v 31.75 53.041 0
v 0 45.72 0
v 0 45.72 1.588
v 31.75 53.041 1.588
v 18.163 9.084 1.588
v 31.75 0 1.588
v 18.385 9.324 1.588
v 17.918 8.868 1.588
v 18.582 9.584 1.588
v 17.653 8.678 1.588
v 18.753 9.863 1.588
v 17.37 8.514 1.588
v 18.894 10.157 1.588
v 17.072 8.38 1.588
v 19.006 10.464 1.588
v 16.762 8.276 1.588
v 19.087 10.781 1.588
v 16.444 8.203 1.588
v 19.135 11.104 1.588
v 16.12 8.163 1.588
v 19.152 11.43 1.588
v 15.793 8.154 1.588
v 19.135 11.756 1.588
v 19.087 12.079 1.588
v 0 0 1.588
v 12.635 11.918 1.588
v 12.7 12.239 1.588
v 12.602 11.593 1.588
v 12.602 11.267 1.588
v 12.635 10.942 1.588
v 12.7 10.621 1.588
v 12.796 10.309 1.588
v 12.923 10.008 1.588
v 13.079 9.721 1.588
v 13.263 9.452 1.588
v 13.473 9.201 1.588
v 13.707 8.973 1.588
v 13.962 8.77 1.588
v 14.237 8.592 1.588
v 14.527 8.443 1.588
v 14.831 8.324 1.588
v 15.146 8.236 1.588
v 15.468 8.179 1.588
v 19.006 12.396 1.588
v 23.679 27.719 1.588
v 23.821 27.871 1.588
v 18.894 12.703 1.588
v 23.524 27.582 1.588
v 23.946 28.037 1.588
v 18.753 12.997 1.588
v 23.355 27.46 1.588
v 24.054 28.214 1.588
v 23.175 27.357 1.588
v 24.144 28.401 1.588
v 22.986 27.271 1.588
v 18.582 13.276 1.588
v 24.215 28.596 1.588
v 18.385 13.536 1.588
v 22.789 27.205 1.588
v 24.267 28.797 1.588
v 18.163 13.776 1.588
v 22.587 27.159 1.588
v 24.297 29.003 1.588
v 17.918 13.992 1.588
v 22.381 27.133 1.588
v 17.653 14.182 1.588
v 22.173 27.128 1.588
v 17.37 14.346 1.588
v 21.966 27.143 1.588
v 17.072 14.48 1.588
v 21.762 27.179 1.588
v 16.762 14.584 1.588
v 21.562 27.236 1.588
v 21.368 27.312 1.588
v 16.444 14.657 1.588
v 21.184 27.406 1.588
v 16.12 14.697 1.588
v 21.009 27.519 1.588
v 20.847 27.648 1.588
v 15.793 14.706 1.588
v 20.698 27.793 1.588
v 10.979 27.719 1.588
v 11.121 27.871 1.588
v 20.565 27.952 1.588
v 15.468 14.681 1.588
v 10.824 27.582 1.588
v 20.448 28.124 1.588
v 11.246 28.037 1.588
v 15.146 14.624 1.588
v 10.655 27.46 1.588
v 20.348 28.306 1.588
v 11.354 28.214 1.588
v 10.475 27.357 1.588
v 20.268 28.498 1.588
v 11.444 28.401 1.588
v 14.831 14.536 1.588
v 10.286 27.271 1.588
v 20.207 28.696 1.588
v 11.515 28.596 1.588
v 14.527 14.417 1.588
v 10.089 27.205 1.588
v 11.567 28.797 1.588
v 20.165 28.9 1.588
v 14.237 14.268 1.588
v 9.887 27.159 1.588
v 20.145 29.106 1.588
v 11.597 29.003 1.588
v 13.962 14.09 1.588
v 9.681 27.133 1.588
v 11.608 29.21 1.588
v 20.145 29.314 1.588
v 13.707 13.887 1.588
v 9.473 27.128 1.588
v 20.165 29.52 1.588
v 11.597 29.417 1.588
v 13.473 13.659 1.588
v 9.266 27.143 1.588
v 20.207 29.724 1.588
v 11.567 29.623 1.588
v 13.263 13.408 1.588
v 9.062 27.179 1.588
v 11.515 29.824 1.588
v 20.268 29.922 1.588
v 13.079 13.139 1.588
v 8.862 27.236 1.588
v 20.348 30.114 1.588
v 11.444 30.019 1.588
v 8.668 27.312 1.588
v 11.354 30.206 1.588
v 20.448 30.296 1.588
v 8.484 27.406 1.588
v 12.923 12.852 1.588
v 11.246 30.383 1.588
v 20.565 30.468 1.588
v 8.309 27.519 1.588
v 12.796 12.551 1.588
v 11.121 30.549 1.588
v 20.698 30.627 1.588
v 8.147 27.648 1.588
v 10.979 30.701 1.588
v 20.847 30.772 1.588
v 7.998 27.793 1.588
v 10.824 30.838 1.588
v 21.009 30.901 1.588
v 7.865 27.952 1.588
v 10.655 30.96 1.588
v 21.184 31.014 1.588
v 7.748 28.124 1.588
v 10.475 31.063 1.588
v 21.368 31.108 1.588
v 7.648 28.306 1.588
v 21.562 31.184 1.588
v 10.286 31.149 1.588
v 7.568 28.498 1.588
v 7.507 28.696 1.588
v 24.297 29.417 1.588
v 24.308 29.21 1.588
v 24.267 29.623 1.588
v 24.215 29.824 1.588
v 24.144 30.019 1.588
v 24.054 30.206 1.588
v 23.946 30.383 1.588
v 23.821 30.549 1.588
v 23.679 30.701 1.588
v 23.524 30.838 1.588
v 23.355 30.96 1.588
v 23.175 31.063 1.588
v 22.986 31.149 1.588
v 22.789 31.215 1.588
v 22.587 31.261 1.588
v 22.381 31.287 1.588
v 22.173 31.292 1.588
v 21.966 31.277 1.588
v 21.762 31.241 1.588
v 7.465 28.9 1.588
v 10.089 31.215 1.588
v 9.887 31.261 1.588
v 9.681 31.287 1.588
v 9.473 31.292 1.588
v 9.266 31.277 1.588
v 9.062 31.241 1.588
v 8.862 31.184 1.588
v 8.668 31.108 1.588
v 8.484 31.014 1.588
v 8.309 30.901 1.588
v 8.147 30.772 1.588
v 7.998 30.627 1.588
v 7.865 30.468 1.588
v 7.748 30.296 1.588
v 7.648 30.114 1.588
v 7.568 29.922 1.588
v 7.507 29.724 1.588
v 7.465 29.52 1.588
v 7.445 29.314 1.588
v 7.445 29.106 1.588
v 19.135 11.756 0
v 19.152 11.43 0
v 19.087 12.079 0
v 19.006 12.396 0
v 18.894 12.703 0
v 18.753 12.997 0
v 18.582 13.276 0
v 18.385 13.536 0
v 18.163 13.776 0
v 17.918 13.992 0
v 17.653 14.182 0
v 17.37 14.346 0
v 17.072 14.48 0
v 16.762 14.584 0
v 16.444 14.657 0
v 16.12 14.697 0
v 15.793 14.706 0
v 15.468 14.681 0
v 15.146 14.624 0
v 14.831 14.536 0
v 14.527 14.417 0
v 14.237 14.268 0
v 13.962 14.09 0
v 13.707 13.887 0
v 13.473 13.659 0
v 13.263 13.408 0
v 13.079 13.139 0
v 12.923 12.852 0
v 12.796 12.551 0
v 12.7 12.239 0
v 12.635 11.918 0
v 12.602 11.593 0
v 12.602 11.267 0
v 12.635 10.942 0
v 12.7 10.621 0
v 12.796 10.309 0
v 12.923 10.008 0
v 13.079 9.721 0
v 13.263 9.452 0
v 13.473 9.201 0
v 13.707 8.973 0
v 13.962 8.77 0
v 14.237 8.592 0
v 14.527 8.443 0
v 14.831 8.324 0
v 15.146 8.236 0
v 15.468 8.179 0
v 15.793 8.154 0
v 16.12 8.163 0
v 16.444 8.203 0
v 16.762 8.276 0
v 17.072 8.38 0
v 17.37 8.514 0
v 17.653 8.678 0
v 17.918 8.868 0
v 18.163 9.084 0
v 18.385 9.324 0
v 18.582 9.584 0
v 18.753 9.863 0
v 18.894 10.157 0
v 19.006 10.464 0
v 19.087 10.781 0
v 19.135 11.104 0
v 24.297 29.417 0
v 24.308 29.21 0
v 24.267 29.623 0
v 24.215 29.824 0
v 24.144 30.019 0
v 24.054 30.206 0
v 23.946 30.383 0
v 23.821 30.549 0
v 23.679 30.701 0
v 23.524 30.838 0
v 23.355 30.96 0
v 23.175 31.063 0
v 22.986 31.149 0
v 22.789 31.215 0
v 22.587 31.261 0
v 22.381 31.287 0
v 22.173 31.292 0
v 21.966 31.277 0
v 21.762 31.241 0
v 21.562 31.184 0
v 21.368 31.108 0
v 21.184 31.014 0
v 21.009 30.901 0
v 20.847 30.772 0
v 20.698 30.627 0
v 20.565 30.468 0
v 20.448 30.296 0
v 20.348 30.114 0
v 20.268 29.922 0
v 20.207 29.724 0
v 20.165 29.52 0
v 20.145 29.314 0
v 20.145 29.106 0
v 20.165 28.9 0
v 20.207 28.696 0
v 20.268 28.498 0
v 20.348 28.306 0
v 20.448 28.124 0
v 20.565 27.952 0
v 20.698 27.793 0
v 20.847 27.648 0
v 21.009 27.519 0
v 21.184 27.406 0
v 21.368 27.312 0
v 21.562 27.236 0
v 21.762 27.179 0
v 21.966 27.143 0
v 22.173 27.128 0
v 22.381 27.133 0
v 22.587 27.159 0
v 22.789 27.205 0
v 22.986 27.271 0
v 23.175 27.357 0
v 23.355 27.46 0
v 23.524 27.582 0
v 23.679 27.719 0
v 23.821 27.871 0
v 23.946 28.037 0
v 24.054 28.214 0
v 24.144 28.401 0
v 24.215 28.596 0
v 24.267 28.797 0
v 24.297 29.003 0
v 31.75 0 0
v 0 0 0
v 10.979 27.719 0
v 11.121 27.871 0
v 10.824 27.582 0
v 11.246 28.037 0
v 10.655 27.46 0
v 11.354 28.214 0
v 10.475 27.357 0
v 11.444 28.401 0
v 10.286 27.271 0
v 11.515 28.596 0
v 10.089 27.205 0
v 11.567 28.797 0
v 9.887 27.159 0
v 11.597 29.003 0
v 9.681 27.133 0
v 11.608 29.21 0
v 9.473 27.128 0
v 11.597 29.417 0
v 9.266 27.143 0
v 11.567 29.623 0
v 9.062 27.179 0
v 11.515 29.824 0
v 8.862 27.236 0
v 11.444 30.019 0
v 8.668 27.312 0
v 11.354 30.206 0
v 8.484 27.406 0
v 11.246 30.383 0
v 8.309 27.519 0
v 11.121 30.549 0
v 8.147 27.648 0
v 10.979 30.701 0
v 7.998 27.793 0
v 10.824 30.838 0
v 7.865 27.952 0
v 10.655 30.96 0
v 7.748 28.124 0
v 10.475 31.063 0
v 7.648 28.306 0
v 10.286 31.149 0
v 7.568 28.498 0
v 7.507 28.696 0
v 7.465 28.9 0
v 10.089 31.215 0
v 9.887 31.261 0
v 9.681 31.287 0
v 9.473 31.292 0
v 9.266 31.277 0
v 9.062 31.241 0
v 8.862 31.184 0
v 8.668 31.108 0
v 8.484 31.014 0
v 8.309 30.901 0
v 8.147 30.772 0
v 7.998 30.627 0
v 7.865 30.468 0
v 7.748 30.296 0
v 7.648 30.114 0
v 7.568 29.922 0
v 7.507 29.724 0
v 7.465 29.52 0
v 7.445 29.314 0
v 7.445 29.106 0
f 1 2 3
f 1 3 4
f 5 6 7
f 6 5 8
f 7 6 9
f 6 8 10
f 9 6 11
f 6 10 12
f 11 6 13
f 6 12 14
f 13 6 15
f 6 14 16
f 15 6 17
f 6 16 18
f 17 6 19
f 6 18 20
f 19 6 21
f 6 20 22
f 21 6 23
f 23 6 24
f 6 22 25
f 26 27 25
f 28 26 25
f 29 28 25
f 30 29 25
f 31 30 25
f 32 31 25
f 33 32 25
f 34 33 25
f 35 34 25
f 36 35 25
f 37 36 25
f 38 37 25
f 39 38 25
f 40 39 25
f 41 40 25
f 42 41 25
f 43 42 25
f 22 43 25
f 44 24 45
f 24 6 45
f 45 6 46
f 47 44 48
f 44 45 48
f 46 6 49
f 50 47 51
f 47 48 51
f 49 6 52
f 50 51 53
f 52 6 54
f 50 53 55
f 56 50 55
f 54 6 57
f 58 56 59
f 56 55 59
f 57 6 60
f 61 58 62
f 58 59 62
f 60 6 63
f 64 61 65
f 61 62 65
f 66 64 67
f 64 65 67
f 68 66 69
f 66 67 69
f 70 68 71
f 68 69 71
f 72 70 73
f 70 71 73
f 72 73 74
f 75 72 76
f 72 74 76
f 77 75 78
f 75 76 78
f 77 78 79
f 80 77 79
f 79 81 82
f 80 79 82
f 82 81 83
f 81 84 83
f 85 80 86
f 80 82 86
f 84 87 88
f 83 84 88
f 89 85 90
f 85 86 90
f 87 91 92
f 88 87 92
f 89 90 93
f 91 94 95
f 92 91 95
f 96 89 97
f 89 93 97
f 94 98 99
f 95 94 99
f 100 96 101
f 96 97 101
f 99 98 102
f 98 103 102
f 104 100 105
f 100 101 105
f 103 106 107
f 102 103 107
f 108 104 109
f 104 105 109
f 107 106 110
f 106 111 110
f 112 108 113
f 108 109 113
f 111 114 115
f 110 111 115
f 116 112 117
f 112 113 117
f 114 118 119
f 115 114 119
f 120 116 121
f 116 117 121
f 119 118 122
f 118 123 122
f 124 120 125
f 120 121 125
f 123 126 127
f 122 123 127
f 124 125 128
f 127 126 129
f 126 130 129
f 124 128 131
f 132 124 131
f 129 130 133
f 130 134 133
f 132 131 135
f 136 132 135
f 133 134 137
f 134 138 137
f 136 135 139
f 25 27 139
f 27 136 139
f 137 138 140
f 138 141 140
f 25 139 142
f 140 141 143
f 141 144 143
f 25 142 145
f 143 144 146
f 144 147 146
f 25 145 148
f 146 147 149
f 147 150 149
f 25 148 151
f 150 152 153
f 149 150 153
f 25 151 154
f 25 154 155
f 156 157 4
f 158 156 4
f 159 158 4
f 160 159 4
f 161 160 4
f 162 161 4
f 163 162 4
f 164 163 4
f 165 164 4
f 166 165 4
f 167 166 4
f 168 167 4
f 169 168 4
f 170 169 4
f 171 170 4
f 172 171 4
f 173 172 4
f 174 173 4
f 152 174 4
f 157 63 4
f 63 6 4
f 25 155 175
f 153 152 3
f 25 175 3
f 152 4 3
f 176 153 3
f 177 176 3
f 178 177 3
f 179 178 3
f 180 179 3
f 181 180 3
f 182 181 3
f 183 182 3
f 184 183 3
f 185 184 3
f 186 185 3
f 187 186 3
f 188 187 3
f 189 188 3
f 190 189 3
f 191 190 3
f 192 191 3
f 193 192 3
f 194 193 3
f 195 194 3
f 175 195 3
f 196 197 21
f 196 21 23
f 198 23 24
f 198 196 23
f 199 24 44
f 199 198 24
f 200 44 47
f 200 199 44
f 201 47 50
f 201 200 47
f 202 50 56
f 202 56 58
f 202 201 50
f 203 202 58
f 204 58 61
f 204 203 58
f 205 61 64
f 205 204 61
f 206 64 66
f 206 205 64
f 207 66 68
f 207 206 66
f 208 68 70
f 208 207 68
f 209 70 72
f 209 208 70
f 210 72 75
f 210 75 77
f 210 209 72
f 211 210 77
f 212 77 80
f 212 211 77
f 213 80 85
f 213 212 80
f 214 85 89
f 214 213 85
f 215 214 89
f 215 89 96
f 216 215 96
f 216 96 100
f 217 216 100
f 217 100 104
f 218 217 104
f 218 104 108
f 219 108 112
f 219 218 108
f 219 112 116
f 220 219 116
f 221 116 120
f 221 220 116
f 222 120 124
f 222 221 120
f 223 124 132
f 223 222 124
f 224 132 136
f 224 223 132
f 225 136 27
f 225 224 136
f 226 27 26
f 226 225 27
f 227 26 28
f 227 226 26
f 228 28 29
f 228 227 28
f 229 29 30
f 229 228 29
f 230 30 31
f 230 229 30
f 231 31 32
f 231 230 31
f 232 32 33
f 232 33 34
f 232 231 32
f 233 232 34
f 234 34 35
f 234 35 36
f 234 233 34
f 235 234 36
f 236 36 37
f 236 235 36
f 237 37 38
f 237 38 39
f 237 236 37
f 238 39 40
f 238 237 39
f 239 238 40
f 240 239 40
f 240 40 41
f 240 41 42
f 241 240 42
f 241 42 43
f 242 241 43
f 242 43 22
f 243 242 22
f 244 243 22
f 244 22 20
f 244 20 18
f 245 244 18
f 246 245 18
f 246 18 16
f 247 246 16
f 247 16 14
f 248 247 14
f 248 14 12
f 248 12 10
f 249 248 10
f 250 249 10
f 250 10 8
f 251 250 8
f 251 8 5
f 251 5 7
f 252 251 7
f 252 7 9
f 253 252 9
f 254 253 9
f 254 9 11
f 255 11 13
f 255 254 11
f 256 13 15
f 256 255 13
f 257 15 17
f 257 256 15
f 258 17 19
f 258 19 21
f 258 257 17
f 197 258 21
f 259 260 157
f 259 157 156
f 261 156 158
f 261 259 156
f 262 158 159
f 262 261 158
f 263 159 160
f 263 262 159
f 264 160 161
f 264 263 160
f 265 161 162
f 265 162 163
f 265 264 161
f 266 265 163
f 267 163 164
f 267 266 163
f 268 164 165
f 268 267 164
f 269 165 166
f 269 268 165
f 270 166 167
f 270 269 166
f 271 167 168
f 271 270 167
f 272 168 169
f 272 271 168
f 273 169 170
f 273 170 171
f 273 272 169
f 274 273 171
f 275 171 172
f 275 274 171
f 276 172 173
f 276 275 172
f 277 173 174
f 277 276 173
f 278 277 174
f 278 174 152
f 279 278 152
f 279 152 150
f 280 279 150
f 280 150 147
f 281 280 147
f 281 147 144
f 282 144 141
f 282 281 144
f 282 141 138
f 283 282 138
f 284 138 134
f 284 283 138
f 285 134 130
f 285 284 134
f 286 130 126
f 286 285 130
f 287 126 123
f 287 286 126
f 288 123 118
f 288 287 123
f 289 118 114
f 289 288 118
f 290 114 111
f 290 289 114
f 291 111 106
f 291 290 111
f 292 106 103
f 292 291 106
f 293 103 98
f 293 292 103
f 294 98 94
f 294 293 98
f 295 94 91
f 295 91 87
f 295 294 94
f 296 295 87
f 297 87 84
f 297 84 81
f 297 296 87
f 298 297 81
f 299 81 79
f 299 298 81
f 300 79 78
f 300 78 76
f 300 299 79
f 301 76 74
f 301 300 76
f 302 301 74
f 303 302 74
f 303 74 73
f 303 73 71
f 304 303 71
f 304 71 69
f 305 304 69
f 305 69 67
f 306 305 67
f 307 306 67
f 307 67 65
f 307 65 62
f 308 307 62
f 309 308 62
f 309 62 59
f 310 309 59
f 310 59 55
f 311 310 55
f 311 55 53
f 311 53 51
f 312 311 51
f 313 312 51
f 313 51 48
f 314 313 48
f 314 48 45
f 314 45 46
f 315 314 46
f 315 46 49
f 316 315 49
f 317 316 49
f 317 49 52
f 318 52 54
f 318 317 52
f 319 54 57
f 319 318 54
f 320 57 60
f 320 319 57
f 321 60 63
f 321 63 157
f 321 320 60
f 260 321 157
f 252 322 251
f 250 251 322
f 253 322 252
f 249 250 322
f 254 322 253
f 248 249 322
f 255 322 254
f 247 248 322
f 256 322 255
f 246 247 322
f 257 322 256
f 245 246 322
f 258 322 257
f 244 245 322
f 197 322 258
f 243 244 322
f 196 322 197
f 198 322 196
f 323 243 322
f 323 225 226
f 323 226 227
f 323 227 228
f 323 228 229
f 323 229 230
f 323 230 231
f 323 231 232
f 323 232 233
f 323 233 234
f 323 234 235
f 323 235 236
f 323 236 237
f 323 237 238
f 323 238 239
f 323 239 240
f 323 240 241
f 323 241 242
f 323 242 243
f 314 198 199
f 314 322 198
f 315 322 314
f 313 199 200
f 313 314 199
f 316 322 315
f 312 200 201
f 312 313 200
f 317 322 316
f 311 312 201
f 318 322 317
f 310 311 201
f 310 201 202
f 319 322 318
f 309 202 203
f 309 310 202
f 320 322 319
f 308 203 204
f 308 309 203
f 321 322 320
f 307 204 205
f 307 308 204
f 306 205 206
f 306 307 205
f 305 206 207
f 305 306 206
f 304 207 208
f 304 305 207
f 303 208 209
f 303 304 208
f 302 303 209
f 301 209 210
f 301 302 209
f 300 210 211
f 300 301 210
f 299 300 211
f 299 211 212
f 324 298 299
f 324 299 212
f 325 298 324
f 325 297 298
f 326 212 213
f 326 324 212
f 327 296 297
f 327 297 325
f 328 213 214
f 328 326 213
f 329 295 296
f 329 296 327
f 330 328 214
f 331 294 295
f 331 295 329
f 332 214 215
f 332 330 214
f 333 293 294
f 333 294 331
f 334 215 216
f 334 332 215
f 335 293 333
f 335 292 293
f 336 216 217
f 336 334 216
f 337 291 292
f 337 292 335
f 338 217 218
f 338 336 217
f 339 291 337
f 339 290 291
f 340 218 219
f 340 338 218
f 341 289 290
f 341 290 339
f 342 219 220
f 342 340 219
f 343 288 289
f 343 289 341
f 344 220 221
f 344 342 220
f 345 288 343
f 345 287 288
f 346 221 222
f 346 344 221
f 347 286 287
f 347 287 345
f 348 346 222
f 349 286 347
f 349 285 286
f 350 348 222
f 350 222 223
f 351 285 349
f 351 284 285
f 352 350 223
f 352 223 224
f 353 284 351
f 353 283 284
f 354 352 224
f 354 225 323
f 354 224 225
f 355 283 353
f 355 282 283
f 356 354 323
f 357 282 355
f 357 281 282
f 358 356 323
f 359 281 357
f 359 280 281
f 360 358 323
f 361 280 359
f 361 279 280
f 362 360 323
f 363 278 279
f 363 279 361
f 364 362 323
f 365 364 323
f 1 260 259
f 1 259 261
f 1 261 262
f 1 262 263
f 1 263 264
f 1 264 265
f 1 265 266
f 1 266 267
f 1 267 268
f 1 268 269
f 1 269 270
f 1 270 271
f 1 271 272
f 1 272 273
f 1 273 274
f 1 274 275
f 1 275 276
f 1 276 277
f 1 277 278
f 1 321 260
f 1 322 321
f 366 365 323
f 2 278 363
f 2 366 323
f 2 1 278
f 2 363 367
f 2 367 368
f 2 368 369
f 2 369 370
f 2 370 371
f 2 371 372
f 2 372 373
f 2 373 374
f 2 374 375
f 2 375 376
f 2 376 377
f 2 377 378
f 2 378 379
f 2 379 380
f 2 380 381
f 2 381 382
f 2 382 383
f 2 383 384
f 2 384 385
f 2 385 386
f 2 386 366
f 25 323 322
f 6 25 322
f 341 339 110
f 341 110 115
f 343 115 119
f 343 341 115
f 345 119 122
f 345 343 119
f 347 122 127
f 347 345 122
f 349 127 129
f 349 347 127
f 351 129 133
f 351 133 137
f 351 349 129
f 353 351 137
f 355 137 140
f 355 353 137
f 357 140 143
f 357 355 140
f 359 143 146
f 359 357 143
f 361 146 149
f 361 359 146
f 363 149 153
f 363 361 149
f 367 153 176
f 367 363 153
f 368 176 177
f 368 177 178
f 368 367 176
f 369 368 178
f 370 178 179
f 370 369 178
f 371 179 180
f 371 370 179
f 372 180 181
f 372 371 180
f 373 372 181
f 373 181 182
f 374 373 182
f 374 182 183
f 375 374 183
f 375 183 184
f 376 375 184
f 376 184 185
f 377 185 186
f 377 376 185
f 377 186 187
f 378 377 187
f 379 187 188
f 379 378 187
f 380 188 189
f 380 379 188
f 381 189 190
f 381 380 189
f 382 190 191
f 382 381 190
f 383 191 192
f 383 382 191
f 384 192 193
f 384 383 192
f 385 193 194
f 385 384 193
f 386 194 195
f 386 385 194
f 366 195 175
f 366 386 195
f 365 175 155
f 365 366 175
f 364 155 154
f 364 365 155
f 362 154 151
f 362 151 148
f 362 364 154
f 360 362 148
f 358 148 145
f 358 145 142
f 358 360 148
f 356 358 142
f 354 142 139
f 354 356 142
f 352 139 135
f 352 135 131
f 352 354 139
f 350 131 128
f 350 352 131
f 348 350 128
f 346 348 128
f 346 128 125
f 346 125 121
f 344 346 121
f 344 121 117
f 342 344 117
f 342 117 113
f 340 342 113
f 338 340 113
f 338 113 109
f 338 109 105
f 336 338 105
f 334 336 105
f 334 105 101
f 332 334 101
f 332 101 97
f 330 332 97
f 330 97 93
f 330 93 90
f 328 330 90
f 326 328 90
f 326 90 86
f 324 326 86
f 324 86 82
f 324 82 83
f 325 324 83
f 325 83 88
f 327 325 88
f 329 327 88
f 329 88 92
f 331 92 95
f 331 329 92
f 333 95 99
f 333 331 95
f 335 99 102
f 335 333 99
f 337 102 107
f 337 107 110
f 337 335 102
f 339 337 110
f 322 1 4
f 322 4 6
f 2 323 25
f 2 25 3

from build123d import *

# Parameters (mm, degrees)
SKETCH2_W           = 31.75
SKETCH2_H           = 22.86
SKETCH2_R           = 3.2766
SKETCH2_H_2         = 12.7
SKETCH2_R_2         = 2.0828
SKETCH2_H_3         = 10.16
BOSS_EXTRUDE1_DEPTH = 1.5875


with BuildPart() as part:
    # Sketch2 → Boss-Extrude1 (new body)
    # profile 1 of 4: a face of its own
    with BuildSketch(Plane.XY):
        with Locations((15.875, 11.43)):
            Rectangle(SKETCH2_W, SKETCH2_H)
        with Locations((15.875, 11.43)):
            Circle(SKETCH2_R, mode=Mode.SUBTRACT)
    # profile 2 of 4: a face of its own
    with BuildSketch(Plane.XY):
        with Locations((15.875, 29.21)):
            Rectangle(SKETCH2_W, SKETCH2_H_2)
        with Locations((9.525, 29.21)):
            Circle(SKETCH2_R_2, mode=Mode.SUBTRACT)
        with Locations((22.225, 29.21)):
            Circle(SKETCH2_R_2, mode=Mode.SUBTRACT)
    # profile 3 of 4: a face of its own
    with BuildSketch(Plane.XY):
        with Locations((15.875, 40.64)):
            Rectangle(SKETCH2_W, SKETCH2_H_3)
    # profile 4 of 4: a face of its own
    with BuildSketch(Plane.XY):
        Polygon((31.75, 53.041010695), (31.75, 45.72), (0, 45.72), align=None)
    extrude(amount=BOSS_EXTRUDE1_DEPTH)


solid = part.part
